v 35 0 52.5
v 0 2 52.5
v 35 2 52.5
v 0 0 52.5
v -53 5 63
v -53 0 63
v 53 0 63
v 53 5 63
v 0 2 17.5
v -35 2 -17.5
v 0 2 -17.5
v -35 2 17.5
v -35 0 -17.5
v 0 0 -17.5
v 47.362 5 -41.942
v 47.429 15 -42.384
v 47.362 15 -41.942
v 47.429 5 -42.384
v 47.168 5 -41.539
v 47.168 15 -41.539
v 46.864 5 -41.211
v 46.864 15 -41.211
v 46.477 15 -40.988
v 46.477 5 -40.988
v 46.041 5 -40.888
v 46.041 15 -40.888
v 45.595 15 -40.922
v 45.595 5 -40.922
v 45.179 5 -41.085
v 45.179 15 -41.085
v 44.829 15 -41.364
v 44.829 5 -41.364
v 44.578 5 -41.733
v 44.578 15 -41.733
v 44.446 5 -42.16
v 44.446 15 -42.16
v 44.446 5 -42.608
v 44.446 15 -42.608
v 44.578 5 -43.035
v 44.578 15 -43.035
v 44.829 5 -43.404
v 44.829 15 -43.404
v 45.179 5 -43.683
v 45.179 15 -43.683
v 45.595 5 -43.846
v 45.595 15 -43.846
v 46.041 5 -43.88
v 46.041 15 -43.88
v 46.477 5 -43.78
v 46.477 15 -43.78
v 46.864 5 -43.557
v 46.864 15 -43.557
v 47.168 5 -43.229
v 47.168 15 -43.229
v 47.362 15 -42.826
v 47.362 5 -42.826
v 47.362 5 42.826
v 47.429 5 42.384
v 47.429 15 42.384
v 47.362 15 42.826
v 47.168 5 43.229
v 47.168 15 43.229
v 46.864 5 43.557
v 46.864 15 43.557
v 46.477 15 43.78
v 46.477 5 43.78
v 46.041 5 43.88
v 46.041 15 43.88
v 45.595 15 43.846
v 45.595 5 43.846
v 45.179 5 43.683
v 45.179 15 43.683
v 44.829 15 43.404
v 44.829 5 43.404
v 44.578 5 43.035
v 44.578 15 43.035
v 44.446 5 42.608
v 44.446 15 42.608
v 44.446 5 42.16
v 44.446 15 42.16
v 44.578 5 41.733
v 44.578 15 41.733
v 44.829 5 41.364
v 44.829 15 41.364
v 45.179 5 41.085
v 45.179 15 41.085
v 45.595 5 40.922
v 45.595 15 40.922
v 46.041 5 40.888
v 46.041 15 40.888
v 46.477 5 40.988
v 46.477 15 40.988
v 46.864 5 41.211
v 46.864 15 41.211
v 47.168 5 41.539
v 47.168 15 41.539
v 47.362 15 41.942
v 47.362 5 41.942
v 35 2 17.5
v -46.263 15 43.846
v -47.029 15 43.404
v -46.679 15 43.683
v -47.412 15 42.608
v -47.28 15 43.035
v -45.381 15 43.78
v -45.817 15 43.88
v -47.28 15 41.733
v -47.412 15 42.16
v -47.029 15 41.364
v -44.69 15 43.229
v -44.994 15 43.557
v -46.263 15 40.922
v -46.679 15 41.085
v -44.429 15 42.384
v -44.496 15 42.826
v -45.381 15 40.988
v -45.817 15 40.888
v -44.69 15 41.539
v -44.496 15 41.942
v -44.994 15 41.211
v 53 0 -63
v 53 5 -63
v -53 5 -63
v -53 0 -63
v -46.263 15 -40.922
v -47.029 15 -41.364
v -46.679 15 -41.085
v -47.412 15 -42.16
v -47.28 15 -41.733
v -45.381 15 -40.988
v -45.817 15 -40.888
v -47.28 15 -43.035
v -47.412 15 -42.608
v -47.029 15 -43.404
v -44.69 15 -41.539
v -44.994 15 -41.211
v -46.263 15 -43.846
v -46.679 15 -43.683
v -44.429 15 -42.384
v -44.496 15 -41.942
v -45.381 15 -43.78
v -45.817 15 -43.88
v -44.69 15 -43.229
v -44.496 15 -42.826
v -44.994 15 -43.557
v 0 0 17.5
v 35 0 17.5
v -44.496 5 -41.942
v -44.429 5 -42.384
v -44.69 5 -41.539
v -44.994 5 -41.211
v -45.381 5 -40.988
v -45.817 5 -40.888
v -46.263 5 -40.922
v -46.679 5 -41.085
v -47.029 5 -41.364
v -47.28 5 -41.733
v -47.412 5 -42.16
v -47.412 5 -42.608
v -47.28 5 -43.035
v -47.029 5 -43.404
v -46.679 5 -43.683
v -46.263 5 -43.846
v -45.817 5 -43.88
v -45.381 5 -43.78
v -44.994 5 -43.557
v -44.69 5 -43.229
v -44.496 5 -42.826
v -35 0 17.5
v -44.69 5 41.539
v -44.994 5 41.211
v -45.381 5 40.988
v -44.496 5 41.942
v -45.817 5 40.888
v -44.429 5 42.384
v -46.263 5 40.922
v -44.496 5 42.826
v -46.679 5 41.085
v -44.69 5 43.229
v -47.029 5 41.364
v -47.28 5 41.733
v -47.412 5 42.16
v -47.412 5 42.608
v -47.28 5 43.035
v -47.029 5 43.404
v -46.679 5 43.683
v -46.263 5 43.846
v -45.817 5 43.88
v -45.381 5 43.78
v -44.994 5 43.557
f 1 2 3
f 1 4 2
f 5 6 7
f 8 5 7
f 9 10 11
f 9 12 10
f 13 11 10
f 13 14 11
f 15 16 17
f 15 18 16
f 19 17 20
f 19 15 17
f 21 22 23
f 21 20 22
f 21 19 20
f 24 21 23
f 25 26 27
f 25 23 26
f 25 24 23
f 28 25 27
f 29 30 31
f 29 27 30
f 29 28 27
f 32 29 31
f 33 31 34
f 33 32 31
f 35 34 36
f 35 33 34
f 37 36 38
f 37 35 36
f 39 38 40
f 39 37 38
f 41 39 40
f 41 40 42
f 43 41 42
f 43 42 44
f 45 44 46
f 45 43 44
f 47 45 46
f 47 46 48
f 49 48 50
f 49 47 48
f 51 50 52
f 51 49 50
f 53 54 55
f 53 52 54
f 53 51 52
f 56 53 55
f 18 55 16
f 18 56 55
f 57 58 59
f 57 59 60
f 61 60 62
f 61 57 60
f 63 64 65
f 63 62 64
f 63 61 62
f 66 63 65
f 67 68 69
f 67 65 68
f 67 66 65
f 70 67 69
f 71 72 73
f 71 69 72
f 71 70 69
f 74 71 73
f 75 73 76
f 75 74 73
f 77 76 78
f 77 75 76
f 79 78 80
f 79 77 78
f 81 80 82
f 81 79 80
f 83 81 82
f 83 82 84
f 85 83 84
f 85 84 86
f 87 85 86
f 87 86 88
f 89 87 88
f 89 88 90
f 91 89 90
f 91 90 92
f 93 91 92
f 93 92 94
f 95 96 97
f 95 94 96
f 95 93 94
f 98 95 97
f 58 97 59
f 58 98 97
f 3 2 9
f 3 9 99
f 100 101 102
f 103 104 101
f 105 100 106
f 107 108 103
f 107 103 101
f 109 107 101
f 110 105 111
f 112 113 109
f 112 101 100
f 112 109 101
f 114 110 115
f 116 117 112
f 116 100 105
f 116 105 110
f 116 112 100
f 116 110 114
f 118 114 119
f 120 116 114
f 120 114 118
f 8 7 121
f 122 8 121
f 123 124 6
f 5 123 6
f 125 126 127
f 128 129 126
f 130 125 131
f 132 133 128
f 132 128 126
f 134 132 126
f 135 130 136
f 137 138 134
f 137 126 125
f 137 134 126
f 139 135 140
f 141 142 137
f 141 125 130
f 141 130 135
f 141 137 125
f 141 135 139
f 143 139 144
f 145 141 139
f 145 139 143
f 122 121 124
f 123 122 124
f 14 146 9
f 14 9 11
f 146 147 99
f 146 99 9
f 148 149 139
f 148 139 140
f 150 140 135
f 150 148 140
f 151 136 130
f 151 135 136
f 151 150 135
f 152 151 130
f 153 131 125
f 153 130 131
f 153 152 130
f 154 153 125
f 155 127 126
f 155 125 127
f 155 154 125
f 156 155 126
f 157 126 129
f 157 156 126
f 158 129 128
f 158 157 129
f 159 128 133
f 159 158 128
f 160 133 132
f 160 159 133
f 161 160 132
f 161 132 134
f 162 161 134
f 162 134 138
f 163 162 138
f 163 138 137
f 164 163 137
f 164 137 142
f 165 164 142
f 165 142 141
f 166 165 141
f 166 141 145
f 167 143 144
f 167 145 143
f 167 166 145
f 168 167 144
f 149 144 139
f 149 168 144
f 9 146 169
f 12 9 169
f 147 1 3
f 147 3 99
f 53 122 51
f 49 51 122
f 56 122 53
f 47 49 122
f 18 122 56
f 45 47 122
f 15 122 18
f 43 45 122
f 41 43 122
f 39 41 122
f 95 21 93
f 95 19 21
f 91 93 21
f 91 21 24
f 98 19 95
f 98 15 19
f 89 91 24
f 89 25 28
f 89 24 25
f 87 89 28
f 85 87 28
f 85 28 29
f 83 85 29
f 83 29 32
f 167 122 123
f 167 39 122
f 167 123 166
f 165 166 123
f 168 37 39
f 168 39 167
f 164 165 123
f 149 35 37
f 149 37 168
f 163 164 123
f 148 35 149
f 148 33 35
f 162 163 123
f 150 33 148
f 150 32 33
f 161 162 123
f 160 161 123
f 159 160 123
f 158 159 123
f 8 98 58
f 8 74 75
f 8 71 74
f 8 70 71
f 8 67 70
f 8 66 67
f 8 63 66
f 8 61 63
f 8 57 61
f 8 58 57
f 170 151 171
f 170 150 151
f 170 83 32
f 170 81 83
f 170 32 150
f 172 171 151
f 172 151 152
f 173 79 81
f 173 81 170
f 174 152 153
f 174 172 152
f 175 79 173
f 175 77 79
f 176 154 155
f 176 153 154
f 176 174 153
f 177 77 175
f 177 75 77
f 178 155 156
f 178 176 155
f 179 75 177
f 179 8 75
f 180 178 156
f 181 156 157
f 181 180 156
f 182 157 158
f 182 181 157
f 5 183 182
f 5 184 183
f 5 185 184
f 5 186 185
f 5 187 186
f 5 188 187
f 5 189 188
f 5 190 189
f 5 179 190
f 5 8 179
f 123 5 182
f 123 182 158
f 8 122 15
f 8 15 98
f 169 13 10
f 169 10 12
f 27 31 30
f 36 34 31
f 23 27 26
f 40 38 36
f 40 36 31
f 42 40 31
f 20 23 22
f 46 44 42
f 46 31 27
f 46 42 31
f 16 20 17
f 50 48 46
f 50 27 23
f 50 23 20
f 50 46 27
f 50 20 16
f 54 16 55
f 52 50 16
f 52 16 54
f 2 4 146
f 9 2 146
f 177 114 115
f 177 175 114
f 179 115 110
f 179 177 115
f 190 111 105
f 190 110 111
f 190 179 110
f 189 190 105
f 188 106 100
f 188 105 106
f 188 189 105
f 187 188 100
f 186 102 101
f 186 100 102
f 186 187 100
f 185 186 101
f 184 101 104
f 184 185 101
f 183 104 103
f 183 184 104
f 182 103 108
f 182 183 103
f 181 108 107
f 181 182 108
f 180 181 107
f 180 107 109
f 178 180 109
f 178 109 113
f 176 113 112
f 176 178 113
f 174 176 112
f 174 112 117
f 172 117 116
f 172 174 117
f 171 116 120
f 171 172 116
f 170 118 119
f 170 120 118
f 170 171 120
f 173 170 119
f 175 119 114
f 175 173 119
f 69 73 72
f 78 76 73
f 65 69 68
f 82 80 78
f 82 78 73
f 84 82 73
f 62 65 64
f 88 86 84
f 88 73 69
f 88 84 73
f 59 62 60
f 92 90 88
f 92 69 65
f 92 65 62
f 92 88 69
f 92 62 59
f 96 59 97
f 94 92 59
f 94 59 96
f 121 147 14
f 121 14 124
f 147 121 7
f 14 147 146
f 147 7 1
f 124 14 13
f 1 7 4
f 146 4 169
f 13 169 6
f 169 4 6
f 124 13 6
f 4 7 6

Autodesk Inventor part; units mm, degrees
ref_plane "YZ Plane" through (0, 0, 0) normal (1, 0, 0) x (0, 1, 0)
ref_plane "XZ Plane" through (0, 0, 0) normal (0, 1, 0) x (-1, 0, 0)
ref_plane "XY Plane" through (0, 0, 0) normal (0, 0, 1) x (1, 0, 0)
sketch "Boceto1" plane through (0, 0, 0) normal (0, 1, 0) x (-1, 0, 0)
  line L0 (53, 63) -> (-53, 63)
  line L1 (-53, 63) -> (-53, -63)
  line L2 (-53, -63) -> (53, -63)
  line L3 (53, -63) -> (53, 63)
  point P0 (0, 0)
  point P1 (0, 63)
  dimension "d1" = 106
  dimension "d2" = 126
  dimension "d3" = 53
  dimension "d4" = 63
extrude "Extrusión1" add sketch "Boceto1" along normal blind 5
sketch "Boceto2" plane through (0, 5, 0) normal (0, 1, 0) x (1, 0, 0)
  circle A0 centre (-45.929, -42.384) radius 1.5
  line L0 (-53, -63) -> (53, -63) projected
  line L1 (-53, 63) -> (-53, -63) projected
  line L2 (-81, 0) -> (77, 0)
  line L3 (0, -130) -> (0, 128)
  circle A1 centre (-45.929, 42.384) radius 1.5
  line L4 (-53, -63) -> (-53, 63)
  circle A2 centre (45.929, -42.384) radius 1.5
  circle A3 centre (45.929, 42.384) radius 1.5
  point P0 (0, 0)
  dimension "d7" = 3
  dimension "d8" = 20.616
  dimension "d9" = 7.071
extrude "Extrusión2" add sketch "Boceto2" along normal blind 10 contours A0 | A1 | A2 | A3
sketch "Boceto3" plane through (0, 0, 0) normal (0, -1, 0) x (1, 0, 0)
  line L0 (-35, 52.5) -> (35, 52.5)
  line L1 (35, 52.5) -> (35, -52.5)
  line L2 (35, -52.5) -> (-35, -52.5)
  line L3 (-35, -52.5) -> (-35, 52.5)
  line L4 (53, -63) -> (-53, -63) projected
  line L5 (-53, 63) -> (53, 63) projected
  line L6 (53, 63) -> (53, -63) projected
  line L7 (-53, -63) -> (-53, 63) projected
  line L8 (35, 17.5) -> (-35, 17.5)
  line L9 (35, -17.5) -> (-35, -17.5)
  line L10 (0, 52.5) -> (0, -52.5)
  point P0 (0, 0)
  point P1 (0, 17.5)
  point P2 (0, -17.5)
  dimension "d12" = 52.5
  dimension "d13" = 126
  dimension "d14" = 106
  dimension "d15" = 52.5
  dimension "d16" = 35
  dimension "d17" = 35
  dimension "d18" = 35
  dimension "d19" = 35
  dimension "d20" = 35
extrude "Extrusión3" cut sketch "Boceto3" against normal blind 2 contours L0 L1 L8 L10 | L8 L10 L9 L3
properties part number "Tapa 0"
